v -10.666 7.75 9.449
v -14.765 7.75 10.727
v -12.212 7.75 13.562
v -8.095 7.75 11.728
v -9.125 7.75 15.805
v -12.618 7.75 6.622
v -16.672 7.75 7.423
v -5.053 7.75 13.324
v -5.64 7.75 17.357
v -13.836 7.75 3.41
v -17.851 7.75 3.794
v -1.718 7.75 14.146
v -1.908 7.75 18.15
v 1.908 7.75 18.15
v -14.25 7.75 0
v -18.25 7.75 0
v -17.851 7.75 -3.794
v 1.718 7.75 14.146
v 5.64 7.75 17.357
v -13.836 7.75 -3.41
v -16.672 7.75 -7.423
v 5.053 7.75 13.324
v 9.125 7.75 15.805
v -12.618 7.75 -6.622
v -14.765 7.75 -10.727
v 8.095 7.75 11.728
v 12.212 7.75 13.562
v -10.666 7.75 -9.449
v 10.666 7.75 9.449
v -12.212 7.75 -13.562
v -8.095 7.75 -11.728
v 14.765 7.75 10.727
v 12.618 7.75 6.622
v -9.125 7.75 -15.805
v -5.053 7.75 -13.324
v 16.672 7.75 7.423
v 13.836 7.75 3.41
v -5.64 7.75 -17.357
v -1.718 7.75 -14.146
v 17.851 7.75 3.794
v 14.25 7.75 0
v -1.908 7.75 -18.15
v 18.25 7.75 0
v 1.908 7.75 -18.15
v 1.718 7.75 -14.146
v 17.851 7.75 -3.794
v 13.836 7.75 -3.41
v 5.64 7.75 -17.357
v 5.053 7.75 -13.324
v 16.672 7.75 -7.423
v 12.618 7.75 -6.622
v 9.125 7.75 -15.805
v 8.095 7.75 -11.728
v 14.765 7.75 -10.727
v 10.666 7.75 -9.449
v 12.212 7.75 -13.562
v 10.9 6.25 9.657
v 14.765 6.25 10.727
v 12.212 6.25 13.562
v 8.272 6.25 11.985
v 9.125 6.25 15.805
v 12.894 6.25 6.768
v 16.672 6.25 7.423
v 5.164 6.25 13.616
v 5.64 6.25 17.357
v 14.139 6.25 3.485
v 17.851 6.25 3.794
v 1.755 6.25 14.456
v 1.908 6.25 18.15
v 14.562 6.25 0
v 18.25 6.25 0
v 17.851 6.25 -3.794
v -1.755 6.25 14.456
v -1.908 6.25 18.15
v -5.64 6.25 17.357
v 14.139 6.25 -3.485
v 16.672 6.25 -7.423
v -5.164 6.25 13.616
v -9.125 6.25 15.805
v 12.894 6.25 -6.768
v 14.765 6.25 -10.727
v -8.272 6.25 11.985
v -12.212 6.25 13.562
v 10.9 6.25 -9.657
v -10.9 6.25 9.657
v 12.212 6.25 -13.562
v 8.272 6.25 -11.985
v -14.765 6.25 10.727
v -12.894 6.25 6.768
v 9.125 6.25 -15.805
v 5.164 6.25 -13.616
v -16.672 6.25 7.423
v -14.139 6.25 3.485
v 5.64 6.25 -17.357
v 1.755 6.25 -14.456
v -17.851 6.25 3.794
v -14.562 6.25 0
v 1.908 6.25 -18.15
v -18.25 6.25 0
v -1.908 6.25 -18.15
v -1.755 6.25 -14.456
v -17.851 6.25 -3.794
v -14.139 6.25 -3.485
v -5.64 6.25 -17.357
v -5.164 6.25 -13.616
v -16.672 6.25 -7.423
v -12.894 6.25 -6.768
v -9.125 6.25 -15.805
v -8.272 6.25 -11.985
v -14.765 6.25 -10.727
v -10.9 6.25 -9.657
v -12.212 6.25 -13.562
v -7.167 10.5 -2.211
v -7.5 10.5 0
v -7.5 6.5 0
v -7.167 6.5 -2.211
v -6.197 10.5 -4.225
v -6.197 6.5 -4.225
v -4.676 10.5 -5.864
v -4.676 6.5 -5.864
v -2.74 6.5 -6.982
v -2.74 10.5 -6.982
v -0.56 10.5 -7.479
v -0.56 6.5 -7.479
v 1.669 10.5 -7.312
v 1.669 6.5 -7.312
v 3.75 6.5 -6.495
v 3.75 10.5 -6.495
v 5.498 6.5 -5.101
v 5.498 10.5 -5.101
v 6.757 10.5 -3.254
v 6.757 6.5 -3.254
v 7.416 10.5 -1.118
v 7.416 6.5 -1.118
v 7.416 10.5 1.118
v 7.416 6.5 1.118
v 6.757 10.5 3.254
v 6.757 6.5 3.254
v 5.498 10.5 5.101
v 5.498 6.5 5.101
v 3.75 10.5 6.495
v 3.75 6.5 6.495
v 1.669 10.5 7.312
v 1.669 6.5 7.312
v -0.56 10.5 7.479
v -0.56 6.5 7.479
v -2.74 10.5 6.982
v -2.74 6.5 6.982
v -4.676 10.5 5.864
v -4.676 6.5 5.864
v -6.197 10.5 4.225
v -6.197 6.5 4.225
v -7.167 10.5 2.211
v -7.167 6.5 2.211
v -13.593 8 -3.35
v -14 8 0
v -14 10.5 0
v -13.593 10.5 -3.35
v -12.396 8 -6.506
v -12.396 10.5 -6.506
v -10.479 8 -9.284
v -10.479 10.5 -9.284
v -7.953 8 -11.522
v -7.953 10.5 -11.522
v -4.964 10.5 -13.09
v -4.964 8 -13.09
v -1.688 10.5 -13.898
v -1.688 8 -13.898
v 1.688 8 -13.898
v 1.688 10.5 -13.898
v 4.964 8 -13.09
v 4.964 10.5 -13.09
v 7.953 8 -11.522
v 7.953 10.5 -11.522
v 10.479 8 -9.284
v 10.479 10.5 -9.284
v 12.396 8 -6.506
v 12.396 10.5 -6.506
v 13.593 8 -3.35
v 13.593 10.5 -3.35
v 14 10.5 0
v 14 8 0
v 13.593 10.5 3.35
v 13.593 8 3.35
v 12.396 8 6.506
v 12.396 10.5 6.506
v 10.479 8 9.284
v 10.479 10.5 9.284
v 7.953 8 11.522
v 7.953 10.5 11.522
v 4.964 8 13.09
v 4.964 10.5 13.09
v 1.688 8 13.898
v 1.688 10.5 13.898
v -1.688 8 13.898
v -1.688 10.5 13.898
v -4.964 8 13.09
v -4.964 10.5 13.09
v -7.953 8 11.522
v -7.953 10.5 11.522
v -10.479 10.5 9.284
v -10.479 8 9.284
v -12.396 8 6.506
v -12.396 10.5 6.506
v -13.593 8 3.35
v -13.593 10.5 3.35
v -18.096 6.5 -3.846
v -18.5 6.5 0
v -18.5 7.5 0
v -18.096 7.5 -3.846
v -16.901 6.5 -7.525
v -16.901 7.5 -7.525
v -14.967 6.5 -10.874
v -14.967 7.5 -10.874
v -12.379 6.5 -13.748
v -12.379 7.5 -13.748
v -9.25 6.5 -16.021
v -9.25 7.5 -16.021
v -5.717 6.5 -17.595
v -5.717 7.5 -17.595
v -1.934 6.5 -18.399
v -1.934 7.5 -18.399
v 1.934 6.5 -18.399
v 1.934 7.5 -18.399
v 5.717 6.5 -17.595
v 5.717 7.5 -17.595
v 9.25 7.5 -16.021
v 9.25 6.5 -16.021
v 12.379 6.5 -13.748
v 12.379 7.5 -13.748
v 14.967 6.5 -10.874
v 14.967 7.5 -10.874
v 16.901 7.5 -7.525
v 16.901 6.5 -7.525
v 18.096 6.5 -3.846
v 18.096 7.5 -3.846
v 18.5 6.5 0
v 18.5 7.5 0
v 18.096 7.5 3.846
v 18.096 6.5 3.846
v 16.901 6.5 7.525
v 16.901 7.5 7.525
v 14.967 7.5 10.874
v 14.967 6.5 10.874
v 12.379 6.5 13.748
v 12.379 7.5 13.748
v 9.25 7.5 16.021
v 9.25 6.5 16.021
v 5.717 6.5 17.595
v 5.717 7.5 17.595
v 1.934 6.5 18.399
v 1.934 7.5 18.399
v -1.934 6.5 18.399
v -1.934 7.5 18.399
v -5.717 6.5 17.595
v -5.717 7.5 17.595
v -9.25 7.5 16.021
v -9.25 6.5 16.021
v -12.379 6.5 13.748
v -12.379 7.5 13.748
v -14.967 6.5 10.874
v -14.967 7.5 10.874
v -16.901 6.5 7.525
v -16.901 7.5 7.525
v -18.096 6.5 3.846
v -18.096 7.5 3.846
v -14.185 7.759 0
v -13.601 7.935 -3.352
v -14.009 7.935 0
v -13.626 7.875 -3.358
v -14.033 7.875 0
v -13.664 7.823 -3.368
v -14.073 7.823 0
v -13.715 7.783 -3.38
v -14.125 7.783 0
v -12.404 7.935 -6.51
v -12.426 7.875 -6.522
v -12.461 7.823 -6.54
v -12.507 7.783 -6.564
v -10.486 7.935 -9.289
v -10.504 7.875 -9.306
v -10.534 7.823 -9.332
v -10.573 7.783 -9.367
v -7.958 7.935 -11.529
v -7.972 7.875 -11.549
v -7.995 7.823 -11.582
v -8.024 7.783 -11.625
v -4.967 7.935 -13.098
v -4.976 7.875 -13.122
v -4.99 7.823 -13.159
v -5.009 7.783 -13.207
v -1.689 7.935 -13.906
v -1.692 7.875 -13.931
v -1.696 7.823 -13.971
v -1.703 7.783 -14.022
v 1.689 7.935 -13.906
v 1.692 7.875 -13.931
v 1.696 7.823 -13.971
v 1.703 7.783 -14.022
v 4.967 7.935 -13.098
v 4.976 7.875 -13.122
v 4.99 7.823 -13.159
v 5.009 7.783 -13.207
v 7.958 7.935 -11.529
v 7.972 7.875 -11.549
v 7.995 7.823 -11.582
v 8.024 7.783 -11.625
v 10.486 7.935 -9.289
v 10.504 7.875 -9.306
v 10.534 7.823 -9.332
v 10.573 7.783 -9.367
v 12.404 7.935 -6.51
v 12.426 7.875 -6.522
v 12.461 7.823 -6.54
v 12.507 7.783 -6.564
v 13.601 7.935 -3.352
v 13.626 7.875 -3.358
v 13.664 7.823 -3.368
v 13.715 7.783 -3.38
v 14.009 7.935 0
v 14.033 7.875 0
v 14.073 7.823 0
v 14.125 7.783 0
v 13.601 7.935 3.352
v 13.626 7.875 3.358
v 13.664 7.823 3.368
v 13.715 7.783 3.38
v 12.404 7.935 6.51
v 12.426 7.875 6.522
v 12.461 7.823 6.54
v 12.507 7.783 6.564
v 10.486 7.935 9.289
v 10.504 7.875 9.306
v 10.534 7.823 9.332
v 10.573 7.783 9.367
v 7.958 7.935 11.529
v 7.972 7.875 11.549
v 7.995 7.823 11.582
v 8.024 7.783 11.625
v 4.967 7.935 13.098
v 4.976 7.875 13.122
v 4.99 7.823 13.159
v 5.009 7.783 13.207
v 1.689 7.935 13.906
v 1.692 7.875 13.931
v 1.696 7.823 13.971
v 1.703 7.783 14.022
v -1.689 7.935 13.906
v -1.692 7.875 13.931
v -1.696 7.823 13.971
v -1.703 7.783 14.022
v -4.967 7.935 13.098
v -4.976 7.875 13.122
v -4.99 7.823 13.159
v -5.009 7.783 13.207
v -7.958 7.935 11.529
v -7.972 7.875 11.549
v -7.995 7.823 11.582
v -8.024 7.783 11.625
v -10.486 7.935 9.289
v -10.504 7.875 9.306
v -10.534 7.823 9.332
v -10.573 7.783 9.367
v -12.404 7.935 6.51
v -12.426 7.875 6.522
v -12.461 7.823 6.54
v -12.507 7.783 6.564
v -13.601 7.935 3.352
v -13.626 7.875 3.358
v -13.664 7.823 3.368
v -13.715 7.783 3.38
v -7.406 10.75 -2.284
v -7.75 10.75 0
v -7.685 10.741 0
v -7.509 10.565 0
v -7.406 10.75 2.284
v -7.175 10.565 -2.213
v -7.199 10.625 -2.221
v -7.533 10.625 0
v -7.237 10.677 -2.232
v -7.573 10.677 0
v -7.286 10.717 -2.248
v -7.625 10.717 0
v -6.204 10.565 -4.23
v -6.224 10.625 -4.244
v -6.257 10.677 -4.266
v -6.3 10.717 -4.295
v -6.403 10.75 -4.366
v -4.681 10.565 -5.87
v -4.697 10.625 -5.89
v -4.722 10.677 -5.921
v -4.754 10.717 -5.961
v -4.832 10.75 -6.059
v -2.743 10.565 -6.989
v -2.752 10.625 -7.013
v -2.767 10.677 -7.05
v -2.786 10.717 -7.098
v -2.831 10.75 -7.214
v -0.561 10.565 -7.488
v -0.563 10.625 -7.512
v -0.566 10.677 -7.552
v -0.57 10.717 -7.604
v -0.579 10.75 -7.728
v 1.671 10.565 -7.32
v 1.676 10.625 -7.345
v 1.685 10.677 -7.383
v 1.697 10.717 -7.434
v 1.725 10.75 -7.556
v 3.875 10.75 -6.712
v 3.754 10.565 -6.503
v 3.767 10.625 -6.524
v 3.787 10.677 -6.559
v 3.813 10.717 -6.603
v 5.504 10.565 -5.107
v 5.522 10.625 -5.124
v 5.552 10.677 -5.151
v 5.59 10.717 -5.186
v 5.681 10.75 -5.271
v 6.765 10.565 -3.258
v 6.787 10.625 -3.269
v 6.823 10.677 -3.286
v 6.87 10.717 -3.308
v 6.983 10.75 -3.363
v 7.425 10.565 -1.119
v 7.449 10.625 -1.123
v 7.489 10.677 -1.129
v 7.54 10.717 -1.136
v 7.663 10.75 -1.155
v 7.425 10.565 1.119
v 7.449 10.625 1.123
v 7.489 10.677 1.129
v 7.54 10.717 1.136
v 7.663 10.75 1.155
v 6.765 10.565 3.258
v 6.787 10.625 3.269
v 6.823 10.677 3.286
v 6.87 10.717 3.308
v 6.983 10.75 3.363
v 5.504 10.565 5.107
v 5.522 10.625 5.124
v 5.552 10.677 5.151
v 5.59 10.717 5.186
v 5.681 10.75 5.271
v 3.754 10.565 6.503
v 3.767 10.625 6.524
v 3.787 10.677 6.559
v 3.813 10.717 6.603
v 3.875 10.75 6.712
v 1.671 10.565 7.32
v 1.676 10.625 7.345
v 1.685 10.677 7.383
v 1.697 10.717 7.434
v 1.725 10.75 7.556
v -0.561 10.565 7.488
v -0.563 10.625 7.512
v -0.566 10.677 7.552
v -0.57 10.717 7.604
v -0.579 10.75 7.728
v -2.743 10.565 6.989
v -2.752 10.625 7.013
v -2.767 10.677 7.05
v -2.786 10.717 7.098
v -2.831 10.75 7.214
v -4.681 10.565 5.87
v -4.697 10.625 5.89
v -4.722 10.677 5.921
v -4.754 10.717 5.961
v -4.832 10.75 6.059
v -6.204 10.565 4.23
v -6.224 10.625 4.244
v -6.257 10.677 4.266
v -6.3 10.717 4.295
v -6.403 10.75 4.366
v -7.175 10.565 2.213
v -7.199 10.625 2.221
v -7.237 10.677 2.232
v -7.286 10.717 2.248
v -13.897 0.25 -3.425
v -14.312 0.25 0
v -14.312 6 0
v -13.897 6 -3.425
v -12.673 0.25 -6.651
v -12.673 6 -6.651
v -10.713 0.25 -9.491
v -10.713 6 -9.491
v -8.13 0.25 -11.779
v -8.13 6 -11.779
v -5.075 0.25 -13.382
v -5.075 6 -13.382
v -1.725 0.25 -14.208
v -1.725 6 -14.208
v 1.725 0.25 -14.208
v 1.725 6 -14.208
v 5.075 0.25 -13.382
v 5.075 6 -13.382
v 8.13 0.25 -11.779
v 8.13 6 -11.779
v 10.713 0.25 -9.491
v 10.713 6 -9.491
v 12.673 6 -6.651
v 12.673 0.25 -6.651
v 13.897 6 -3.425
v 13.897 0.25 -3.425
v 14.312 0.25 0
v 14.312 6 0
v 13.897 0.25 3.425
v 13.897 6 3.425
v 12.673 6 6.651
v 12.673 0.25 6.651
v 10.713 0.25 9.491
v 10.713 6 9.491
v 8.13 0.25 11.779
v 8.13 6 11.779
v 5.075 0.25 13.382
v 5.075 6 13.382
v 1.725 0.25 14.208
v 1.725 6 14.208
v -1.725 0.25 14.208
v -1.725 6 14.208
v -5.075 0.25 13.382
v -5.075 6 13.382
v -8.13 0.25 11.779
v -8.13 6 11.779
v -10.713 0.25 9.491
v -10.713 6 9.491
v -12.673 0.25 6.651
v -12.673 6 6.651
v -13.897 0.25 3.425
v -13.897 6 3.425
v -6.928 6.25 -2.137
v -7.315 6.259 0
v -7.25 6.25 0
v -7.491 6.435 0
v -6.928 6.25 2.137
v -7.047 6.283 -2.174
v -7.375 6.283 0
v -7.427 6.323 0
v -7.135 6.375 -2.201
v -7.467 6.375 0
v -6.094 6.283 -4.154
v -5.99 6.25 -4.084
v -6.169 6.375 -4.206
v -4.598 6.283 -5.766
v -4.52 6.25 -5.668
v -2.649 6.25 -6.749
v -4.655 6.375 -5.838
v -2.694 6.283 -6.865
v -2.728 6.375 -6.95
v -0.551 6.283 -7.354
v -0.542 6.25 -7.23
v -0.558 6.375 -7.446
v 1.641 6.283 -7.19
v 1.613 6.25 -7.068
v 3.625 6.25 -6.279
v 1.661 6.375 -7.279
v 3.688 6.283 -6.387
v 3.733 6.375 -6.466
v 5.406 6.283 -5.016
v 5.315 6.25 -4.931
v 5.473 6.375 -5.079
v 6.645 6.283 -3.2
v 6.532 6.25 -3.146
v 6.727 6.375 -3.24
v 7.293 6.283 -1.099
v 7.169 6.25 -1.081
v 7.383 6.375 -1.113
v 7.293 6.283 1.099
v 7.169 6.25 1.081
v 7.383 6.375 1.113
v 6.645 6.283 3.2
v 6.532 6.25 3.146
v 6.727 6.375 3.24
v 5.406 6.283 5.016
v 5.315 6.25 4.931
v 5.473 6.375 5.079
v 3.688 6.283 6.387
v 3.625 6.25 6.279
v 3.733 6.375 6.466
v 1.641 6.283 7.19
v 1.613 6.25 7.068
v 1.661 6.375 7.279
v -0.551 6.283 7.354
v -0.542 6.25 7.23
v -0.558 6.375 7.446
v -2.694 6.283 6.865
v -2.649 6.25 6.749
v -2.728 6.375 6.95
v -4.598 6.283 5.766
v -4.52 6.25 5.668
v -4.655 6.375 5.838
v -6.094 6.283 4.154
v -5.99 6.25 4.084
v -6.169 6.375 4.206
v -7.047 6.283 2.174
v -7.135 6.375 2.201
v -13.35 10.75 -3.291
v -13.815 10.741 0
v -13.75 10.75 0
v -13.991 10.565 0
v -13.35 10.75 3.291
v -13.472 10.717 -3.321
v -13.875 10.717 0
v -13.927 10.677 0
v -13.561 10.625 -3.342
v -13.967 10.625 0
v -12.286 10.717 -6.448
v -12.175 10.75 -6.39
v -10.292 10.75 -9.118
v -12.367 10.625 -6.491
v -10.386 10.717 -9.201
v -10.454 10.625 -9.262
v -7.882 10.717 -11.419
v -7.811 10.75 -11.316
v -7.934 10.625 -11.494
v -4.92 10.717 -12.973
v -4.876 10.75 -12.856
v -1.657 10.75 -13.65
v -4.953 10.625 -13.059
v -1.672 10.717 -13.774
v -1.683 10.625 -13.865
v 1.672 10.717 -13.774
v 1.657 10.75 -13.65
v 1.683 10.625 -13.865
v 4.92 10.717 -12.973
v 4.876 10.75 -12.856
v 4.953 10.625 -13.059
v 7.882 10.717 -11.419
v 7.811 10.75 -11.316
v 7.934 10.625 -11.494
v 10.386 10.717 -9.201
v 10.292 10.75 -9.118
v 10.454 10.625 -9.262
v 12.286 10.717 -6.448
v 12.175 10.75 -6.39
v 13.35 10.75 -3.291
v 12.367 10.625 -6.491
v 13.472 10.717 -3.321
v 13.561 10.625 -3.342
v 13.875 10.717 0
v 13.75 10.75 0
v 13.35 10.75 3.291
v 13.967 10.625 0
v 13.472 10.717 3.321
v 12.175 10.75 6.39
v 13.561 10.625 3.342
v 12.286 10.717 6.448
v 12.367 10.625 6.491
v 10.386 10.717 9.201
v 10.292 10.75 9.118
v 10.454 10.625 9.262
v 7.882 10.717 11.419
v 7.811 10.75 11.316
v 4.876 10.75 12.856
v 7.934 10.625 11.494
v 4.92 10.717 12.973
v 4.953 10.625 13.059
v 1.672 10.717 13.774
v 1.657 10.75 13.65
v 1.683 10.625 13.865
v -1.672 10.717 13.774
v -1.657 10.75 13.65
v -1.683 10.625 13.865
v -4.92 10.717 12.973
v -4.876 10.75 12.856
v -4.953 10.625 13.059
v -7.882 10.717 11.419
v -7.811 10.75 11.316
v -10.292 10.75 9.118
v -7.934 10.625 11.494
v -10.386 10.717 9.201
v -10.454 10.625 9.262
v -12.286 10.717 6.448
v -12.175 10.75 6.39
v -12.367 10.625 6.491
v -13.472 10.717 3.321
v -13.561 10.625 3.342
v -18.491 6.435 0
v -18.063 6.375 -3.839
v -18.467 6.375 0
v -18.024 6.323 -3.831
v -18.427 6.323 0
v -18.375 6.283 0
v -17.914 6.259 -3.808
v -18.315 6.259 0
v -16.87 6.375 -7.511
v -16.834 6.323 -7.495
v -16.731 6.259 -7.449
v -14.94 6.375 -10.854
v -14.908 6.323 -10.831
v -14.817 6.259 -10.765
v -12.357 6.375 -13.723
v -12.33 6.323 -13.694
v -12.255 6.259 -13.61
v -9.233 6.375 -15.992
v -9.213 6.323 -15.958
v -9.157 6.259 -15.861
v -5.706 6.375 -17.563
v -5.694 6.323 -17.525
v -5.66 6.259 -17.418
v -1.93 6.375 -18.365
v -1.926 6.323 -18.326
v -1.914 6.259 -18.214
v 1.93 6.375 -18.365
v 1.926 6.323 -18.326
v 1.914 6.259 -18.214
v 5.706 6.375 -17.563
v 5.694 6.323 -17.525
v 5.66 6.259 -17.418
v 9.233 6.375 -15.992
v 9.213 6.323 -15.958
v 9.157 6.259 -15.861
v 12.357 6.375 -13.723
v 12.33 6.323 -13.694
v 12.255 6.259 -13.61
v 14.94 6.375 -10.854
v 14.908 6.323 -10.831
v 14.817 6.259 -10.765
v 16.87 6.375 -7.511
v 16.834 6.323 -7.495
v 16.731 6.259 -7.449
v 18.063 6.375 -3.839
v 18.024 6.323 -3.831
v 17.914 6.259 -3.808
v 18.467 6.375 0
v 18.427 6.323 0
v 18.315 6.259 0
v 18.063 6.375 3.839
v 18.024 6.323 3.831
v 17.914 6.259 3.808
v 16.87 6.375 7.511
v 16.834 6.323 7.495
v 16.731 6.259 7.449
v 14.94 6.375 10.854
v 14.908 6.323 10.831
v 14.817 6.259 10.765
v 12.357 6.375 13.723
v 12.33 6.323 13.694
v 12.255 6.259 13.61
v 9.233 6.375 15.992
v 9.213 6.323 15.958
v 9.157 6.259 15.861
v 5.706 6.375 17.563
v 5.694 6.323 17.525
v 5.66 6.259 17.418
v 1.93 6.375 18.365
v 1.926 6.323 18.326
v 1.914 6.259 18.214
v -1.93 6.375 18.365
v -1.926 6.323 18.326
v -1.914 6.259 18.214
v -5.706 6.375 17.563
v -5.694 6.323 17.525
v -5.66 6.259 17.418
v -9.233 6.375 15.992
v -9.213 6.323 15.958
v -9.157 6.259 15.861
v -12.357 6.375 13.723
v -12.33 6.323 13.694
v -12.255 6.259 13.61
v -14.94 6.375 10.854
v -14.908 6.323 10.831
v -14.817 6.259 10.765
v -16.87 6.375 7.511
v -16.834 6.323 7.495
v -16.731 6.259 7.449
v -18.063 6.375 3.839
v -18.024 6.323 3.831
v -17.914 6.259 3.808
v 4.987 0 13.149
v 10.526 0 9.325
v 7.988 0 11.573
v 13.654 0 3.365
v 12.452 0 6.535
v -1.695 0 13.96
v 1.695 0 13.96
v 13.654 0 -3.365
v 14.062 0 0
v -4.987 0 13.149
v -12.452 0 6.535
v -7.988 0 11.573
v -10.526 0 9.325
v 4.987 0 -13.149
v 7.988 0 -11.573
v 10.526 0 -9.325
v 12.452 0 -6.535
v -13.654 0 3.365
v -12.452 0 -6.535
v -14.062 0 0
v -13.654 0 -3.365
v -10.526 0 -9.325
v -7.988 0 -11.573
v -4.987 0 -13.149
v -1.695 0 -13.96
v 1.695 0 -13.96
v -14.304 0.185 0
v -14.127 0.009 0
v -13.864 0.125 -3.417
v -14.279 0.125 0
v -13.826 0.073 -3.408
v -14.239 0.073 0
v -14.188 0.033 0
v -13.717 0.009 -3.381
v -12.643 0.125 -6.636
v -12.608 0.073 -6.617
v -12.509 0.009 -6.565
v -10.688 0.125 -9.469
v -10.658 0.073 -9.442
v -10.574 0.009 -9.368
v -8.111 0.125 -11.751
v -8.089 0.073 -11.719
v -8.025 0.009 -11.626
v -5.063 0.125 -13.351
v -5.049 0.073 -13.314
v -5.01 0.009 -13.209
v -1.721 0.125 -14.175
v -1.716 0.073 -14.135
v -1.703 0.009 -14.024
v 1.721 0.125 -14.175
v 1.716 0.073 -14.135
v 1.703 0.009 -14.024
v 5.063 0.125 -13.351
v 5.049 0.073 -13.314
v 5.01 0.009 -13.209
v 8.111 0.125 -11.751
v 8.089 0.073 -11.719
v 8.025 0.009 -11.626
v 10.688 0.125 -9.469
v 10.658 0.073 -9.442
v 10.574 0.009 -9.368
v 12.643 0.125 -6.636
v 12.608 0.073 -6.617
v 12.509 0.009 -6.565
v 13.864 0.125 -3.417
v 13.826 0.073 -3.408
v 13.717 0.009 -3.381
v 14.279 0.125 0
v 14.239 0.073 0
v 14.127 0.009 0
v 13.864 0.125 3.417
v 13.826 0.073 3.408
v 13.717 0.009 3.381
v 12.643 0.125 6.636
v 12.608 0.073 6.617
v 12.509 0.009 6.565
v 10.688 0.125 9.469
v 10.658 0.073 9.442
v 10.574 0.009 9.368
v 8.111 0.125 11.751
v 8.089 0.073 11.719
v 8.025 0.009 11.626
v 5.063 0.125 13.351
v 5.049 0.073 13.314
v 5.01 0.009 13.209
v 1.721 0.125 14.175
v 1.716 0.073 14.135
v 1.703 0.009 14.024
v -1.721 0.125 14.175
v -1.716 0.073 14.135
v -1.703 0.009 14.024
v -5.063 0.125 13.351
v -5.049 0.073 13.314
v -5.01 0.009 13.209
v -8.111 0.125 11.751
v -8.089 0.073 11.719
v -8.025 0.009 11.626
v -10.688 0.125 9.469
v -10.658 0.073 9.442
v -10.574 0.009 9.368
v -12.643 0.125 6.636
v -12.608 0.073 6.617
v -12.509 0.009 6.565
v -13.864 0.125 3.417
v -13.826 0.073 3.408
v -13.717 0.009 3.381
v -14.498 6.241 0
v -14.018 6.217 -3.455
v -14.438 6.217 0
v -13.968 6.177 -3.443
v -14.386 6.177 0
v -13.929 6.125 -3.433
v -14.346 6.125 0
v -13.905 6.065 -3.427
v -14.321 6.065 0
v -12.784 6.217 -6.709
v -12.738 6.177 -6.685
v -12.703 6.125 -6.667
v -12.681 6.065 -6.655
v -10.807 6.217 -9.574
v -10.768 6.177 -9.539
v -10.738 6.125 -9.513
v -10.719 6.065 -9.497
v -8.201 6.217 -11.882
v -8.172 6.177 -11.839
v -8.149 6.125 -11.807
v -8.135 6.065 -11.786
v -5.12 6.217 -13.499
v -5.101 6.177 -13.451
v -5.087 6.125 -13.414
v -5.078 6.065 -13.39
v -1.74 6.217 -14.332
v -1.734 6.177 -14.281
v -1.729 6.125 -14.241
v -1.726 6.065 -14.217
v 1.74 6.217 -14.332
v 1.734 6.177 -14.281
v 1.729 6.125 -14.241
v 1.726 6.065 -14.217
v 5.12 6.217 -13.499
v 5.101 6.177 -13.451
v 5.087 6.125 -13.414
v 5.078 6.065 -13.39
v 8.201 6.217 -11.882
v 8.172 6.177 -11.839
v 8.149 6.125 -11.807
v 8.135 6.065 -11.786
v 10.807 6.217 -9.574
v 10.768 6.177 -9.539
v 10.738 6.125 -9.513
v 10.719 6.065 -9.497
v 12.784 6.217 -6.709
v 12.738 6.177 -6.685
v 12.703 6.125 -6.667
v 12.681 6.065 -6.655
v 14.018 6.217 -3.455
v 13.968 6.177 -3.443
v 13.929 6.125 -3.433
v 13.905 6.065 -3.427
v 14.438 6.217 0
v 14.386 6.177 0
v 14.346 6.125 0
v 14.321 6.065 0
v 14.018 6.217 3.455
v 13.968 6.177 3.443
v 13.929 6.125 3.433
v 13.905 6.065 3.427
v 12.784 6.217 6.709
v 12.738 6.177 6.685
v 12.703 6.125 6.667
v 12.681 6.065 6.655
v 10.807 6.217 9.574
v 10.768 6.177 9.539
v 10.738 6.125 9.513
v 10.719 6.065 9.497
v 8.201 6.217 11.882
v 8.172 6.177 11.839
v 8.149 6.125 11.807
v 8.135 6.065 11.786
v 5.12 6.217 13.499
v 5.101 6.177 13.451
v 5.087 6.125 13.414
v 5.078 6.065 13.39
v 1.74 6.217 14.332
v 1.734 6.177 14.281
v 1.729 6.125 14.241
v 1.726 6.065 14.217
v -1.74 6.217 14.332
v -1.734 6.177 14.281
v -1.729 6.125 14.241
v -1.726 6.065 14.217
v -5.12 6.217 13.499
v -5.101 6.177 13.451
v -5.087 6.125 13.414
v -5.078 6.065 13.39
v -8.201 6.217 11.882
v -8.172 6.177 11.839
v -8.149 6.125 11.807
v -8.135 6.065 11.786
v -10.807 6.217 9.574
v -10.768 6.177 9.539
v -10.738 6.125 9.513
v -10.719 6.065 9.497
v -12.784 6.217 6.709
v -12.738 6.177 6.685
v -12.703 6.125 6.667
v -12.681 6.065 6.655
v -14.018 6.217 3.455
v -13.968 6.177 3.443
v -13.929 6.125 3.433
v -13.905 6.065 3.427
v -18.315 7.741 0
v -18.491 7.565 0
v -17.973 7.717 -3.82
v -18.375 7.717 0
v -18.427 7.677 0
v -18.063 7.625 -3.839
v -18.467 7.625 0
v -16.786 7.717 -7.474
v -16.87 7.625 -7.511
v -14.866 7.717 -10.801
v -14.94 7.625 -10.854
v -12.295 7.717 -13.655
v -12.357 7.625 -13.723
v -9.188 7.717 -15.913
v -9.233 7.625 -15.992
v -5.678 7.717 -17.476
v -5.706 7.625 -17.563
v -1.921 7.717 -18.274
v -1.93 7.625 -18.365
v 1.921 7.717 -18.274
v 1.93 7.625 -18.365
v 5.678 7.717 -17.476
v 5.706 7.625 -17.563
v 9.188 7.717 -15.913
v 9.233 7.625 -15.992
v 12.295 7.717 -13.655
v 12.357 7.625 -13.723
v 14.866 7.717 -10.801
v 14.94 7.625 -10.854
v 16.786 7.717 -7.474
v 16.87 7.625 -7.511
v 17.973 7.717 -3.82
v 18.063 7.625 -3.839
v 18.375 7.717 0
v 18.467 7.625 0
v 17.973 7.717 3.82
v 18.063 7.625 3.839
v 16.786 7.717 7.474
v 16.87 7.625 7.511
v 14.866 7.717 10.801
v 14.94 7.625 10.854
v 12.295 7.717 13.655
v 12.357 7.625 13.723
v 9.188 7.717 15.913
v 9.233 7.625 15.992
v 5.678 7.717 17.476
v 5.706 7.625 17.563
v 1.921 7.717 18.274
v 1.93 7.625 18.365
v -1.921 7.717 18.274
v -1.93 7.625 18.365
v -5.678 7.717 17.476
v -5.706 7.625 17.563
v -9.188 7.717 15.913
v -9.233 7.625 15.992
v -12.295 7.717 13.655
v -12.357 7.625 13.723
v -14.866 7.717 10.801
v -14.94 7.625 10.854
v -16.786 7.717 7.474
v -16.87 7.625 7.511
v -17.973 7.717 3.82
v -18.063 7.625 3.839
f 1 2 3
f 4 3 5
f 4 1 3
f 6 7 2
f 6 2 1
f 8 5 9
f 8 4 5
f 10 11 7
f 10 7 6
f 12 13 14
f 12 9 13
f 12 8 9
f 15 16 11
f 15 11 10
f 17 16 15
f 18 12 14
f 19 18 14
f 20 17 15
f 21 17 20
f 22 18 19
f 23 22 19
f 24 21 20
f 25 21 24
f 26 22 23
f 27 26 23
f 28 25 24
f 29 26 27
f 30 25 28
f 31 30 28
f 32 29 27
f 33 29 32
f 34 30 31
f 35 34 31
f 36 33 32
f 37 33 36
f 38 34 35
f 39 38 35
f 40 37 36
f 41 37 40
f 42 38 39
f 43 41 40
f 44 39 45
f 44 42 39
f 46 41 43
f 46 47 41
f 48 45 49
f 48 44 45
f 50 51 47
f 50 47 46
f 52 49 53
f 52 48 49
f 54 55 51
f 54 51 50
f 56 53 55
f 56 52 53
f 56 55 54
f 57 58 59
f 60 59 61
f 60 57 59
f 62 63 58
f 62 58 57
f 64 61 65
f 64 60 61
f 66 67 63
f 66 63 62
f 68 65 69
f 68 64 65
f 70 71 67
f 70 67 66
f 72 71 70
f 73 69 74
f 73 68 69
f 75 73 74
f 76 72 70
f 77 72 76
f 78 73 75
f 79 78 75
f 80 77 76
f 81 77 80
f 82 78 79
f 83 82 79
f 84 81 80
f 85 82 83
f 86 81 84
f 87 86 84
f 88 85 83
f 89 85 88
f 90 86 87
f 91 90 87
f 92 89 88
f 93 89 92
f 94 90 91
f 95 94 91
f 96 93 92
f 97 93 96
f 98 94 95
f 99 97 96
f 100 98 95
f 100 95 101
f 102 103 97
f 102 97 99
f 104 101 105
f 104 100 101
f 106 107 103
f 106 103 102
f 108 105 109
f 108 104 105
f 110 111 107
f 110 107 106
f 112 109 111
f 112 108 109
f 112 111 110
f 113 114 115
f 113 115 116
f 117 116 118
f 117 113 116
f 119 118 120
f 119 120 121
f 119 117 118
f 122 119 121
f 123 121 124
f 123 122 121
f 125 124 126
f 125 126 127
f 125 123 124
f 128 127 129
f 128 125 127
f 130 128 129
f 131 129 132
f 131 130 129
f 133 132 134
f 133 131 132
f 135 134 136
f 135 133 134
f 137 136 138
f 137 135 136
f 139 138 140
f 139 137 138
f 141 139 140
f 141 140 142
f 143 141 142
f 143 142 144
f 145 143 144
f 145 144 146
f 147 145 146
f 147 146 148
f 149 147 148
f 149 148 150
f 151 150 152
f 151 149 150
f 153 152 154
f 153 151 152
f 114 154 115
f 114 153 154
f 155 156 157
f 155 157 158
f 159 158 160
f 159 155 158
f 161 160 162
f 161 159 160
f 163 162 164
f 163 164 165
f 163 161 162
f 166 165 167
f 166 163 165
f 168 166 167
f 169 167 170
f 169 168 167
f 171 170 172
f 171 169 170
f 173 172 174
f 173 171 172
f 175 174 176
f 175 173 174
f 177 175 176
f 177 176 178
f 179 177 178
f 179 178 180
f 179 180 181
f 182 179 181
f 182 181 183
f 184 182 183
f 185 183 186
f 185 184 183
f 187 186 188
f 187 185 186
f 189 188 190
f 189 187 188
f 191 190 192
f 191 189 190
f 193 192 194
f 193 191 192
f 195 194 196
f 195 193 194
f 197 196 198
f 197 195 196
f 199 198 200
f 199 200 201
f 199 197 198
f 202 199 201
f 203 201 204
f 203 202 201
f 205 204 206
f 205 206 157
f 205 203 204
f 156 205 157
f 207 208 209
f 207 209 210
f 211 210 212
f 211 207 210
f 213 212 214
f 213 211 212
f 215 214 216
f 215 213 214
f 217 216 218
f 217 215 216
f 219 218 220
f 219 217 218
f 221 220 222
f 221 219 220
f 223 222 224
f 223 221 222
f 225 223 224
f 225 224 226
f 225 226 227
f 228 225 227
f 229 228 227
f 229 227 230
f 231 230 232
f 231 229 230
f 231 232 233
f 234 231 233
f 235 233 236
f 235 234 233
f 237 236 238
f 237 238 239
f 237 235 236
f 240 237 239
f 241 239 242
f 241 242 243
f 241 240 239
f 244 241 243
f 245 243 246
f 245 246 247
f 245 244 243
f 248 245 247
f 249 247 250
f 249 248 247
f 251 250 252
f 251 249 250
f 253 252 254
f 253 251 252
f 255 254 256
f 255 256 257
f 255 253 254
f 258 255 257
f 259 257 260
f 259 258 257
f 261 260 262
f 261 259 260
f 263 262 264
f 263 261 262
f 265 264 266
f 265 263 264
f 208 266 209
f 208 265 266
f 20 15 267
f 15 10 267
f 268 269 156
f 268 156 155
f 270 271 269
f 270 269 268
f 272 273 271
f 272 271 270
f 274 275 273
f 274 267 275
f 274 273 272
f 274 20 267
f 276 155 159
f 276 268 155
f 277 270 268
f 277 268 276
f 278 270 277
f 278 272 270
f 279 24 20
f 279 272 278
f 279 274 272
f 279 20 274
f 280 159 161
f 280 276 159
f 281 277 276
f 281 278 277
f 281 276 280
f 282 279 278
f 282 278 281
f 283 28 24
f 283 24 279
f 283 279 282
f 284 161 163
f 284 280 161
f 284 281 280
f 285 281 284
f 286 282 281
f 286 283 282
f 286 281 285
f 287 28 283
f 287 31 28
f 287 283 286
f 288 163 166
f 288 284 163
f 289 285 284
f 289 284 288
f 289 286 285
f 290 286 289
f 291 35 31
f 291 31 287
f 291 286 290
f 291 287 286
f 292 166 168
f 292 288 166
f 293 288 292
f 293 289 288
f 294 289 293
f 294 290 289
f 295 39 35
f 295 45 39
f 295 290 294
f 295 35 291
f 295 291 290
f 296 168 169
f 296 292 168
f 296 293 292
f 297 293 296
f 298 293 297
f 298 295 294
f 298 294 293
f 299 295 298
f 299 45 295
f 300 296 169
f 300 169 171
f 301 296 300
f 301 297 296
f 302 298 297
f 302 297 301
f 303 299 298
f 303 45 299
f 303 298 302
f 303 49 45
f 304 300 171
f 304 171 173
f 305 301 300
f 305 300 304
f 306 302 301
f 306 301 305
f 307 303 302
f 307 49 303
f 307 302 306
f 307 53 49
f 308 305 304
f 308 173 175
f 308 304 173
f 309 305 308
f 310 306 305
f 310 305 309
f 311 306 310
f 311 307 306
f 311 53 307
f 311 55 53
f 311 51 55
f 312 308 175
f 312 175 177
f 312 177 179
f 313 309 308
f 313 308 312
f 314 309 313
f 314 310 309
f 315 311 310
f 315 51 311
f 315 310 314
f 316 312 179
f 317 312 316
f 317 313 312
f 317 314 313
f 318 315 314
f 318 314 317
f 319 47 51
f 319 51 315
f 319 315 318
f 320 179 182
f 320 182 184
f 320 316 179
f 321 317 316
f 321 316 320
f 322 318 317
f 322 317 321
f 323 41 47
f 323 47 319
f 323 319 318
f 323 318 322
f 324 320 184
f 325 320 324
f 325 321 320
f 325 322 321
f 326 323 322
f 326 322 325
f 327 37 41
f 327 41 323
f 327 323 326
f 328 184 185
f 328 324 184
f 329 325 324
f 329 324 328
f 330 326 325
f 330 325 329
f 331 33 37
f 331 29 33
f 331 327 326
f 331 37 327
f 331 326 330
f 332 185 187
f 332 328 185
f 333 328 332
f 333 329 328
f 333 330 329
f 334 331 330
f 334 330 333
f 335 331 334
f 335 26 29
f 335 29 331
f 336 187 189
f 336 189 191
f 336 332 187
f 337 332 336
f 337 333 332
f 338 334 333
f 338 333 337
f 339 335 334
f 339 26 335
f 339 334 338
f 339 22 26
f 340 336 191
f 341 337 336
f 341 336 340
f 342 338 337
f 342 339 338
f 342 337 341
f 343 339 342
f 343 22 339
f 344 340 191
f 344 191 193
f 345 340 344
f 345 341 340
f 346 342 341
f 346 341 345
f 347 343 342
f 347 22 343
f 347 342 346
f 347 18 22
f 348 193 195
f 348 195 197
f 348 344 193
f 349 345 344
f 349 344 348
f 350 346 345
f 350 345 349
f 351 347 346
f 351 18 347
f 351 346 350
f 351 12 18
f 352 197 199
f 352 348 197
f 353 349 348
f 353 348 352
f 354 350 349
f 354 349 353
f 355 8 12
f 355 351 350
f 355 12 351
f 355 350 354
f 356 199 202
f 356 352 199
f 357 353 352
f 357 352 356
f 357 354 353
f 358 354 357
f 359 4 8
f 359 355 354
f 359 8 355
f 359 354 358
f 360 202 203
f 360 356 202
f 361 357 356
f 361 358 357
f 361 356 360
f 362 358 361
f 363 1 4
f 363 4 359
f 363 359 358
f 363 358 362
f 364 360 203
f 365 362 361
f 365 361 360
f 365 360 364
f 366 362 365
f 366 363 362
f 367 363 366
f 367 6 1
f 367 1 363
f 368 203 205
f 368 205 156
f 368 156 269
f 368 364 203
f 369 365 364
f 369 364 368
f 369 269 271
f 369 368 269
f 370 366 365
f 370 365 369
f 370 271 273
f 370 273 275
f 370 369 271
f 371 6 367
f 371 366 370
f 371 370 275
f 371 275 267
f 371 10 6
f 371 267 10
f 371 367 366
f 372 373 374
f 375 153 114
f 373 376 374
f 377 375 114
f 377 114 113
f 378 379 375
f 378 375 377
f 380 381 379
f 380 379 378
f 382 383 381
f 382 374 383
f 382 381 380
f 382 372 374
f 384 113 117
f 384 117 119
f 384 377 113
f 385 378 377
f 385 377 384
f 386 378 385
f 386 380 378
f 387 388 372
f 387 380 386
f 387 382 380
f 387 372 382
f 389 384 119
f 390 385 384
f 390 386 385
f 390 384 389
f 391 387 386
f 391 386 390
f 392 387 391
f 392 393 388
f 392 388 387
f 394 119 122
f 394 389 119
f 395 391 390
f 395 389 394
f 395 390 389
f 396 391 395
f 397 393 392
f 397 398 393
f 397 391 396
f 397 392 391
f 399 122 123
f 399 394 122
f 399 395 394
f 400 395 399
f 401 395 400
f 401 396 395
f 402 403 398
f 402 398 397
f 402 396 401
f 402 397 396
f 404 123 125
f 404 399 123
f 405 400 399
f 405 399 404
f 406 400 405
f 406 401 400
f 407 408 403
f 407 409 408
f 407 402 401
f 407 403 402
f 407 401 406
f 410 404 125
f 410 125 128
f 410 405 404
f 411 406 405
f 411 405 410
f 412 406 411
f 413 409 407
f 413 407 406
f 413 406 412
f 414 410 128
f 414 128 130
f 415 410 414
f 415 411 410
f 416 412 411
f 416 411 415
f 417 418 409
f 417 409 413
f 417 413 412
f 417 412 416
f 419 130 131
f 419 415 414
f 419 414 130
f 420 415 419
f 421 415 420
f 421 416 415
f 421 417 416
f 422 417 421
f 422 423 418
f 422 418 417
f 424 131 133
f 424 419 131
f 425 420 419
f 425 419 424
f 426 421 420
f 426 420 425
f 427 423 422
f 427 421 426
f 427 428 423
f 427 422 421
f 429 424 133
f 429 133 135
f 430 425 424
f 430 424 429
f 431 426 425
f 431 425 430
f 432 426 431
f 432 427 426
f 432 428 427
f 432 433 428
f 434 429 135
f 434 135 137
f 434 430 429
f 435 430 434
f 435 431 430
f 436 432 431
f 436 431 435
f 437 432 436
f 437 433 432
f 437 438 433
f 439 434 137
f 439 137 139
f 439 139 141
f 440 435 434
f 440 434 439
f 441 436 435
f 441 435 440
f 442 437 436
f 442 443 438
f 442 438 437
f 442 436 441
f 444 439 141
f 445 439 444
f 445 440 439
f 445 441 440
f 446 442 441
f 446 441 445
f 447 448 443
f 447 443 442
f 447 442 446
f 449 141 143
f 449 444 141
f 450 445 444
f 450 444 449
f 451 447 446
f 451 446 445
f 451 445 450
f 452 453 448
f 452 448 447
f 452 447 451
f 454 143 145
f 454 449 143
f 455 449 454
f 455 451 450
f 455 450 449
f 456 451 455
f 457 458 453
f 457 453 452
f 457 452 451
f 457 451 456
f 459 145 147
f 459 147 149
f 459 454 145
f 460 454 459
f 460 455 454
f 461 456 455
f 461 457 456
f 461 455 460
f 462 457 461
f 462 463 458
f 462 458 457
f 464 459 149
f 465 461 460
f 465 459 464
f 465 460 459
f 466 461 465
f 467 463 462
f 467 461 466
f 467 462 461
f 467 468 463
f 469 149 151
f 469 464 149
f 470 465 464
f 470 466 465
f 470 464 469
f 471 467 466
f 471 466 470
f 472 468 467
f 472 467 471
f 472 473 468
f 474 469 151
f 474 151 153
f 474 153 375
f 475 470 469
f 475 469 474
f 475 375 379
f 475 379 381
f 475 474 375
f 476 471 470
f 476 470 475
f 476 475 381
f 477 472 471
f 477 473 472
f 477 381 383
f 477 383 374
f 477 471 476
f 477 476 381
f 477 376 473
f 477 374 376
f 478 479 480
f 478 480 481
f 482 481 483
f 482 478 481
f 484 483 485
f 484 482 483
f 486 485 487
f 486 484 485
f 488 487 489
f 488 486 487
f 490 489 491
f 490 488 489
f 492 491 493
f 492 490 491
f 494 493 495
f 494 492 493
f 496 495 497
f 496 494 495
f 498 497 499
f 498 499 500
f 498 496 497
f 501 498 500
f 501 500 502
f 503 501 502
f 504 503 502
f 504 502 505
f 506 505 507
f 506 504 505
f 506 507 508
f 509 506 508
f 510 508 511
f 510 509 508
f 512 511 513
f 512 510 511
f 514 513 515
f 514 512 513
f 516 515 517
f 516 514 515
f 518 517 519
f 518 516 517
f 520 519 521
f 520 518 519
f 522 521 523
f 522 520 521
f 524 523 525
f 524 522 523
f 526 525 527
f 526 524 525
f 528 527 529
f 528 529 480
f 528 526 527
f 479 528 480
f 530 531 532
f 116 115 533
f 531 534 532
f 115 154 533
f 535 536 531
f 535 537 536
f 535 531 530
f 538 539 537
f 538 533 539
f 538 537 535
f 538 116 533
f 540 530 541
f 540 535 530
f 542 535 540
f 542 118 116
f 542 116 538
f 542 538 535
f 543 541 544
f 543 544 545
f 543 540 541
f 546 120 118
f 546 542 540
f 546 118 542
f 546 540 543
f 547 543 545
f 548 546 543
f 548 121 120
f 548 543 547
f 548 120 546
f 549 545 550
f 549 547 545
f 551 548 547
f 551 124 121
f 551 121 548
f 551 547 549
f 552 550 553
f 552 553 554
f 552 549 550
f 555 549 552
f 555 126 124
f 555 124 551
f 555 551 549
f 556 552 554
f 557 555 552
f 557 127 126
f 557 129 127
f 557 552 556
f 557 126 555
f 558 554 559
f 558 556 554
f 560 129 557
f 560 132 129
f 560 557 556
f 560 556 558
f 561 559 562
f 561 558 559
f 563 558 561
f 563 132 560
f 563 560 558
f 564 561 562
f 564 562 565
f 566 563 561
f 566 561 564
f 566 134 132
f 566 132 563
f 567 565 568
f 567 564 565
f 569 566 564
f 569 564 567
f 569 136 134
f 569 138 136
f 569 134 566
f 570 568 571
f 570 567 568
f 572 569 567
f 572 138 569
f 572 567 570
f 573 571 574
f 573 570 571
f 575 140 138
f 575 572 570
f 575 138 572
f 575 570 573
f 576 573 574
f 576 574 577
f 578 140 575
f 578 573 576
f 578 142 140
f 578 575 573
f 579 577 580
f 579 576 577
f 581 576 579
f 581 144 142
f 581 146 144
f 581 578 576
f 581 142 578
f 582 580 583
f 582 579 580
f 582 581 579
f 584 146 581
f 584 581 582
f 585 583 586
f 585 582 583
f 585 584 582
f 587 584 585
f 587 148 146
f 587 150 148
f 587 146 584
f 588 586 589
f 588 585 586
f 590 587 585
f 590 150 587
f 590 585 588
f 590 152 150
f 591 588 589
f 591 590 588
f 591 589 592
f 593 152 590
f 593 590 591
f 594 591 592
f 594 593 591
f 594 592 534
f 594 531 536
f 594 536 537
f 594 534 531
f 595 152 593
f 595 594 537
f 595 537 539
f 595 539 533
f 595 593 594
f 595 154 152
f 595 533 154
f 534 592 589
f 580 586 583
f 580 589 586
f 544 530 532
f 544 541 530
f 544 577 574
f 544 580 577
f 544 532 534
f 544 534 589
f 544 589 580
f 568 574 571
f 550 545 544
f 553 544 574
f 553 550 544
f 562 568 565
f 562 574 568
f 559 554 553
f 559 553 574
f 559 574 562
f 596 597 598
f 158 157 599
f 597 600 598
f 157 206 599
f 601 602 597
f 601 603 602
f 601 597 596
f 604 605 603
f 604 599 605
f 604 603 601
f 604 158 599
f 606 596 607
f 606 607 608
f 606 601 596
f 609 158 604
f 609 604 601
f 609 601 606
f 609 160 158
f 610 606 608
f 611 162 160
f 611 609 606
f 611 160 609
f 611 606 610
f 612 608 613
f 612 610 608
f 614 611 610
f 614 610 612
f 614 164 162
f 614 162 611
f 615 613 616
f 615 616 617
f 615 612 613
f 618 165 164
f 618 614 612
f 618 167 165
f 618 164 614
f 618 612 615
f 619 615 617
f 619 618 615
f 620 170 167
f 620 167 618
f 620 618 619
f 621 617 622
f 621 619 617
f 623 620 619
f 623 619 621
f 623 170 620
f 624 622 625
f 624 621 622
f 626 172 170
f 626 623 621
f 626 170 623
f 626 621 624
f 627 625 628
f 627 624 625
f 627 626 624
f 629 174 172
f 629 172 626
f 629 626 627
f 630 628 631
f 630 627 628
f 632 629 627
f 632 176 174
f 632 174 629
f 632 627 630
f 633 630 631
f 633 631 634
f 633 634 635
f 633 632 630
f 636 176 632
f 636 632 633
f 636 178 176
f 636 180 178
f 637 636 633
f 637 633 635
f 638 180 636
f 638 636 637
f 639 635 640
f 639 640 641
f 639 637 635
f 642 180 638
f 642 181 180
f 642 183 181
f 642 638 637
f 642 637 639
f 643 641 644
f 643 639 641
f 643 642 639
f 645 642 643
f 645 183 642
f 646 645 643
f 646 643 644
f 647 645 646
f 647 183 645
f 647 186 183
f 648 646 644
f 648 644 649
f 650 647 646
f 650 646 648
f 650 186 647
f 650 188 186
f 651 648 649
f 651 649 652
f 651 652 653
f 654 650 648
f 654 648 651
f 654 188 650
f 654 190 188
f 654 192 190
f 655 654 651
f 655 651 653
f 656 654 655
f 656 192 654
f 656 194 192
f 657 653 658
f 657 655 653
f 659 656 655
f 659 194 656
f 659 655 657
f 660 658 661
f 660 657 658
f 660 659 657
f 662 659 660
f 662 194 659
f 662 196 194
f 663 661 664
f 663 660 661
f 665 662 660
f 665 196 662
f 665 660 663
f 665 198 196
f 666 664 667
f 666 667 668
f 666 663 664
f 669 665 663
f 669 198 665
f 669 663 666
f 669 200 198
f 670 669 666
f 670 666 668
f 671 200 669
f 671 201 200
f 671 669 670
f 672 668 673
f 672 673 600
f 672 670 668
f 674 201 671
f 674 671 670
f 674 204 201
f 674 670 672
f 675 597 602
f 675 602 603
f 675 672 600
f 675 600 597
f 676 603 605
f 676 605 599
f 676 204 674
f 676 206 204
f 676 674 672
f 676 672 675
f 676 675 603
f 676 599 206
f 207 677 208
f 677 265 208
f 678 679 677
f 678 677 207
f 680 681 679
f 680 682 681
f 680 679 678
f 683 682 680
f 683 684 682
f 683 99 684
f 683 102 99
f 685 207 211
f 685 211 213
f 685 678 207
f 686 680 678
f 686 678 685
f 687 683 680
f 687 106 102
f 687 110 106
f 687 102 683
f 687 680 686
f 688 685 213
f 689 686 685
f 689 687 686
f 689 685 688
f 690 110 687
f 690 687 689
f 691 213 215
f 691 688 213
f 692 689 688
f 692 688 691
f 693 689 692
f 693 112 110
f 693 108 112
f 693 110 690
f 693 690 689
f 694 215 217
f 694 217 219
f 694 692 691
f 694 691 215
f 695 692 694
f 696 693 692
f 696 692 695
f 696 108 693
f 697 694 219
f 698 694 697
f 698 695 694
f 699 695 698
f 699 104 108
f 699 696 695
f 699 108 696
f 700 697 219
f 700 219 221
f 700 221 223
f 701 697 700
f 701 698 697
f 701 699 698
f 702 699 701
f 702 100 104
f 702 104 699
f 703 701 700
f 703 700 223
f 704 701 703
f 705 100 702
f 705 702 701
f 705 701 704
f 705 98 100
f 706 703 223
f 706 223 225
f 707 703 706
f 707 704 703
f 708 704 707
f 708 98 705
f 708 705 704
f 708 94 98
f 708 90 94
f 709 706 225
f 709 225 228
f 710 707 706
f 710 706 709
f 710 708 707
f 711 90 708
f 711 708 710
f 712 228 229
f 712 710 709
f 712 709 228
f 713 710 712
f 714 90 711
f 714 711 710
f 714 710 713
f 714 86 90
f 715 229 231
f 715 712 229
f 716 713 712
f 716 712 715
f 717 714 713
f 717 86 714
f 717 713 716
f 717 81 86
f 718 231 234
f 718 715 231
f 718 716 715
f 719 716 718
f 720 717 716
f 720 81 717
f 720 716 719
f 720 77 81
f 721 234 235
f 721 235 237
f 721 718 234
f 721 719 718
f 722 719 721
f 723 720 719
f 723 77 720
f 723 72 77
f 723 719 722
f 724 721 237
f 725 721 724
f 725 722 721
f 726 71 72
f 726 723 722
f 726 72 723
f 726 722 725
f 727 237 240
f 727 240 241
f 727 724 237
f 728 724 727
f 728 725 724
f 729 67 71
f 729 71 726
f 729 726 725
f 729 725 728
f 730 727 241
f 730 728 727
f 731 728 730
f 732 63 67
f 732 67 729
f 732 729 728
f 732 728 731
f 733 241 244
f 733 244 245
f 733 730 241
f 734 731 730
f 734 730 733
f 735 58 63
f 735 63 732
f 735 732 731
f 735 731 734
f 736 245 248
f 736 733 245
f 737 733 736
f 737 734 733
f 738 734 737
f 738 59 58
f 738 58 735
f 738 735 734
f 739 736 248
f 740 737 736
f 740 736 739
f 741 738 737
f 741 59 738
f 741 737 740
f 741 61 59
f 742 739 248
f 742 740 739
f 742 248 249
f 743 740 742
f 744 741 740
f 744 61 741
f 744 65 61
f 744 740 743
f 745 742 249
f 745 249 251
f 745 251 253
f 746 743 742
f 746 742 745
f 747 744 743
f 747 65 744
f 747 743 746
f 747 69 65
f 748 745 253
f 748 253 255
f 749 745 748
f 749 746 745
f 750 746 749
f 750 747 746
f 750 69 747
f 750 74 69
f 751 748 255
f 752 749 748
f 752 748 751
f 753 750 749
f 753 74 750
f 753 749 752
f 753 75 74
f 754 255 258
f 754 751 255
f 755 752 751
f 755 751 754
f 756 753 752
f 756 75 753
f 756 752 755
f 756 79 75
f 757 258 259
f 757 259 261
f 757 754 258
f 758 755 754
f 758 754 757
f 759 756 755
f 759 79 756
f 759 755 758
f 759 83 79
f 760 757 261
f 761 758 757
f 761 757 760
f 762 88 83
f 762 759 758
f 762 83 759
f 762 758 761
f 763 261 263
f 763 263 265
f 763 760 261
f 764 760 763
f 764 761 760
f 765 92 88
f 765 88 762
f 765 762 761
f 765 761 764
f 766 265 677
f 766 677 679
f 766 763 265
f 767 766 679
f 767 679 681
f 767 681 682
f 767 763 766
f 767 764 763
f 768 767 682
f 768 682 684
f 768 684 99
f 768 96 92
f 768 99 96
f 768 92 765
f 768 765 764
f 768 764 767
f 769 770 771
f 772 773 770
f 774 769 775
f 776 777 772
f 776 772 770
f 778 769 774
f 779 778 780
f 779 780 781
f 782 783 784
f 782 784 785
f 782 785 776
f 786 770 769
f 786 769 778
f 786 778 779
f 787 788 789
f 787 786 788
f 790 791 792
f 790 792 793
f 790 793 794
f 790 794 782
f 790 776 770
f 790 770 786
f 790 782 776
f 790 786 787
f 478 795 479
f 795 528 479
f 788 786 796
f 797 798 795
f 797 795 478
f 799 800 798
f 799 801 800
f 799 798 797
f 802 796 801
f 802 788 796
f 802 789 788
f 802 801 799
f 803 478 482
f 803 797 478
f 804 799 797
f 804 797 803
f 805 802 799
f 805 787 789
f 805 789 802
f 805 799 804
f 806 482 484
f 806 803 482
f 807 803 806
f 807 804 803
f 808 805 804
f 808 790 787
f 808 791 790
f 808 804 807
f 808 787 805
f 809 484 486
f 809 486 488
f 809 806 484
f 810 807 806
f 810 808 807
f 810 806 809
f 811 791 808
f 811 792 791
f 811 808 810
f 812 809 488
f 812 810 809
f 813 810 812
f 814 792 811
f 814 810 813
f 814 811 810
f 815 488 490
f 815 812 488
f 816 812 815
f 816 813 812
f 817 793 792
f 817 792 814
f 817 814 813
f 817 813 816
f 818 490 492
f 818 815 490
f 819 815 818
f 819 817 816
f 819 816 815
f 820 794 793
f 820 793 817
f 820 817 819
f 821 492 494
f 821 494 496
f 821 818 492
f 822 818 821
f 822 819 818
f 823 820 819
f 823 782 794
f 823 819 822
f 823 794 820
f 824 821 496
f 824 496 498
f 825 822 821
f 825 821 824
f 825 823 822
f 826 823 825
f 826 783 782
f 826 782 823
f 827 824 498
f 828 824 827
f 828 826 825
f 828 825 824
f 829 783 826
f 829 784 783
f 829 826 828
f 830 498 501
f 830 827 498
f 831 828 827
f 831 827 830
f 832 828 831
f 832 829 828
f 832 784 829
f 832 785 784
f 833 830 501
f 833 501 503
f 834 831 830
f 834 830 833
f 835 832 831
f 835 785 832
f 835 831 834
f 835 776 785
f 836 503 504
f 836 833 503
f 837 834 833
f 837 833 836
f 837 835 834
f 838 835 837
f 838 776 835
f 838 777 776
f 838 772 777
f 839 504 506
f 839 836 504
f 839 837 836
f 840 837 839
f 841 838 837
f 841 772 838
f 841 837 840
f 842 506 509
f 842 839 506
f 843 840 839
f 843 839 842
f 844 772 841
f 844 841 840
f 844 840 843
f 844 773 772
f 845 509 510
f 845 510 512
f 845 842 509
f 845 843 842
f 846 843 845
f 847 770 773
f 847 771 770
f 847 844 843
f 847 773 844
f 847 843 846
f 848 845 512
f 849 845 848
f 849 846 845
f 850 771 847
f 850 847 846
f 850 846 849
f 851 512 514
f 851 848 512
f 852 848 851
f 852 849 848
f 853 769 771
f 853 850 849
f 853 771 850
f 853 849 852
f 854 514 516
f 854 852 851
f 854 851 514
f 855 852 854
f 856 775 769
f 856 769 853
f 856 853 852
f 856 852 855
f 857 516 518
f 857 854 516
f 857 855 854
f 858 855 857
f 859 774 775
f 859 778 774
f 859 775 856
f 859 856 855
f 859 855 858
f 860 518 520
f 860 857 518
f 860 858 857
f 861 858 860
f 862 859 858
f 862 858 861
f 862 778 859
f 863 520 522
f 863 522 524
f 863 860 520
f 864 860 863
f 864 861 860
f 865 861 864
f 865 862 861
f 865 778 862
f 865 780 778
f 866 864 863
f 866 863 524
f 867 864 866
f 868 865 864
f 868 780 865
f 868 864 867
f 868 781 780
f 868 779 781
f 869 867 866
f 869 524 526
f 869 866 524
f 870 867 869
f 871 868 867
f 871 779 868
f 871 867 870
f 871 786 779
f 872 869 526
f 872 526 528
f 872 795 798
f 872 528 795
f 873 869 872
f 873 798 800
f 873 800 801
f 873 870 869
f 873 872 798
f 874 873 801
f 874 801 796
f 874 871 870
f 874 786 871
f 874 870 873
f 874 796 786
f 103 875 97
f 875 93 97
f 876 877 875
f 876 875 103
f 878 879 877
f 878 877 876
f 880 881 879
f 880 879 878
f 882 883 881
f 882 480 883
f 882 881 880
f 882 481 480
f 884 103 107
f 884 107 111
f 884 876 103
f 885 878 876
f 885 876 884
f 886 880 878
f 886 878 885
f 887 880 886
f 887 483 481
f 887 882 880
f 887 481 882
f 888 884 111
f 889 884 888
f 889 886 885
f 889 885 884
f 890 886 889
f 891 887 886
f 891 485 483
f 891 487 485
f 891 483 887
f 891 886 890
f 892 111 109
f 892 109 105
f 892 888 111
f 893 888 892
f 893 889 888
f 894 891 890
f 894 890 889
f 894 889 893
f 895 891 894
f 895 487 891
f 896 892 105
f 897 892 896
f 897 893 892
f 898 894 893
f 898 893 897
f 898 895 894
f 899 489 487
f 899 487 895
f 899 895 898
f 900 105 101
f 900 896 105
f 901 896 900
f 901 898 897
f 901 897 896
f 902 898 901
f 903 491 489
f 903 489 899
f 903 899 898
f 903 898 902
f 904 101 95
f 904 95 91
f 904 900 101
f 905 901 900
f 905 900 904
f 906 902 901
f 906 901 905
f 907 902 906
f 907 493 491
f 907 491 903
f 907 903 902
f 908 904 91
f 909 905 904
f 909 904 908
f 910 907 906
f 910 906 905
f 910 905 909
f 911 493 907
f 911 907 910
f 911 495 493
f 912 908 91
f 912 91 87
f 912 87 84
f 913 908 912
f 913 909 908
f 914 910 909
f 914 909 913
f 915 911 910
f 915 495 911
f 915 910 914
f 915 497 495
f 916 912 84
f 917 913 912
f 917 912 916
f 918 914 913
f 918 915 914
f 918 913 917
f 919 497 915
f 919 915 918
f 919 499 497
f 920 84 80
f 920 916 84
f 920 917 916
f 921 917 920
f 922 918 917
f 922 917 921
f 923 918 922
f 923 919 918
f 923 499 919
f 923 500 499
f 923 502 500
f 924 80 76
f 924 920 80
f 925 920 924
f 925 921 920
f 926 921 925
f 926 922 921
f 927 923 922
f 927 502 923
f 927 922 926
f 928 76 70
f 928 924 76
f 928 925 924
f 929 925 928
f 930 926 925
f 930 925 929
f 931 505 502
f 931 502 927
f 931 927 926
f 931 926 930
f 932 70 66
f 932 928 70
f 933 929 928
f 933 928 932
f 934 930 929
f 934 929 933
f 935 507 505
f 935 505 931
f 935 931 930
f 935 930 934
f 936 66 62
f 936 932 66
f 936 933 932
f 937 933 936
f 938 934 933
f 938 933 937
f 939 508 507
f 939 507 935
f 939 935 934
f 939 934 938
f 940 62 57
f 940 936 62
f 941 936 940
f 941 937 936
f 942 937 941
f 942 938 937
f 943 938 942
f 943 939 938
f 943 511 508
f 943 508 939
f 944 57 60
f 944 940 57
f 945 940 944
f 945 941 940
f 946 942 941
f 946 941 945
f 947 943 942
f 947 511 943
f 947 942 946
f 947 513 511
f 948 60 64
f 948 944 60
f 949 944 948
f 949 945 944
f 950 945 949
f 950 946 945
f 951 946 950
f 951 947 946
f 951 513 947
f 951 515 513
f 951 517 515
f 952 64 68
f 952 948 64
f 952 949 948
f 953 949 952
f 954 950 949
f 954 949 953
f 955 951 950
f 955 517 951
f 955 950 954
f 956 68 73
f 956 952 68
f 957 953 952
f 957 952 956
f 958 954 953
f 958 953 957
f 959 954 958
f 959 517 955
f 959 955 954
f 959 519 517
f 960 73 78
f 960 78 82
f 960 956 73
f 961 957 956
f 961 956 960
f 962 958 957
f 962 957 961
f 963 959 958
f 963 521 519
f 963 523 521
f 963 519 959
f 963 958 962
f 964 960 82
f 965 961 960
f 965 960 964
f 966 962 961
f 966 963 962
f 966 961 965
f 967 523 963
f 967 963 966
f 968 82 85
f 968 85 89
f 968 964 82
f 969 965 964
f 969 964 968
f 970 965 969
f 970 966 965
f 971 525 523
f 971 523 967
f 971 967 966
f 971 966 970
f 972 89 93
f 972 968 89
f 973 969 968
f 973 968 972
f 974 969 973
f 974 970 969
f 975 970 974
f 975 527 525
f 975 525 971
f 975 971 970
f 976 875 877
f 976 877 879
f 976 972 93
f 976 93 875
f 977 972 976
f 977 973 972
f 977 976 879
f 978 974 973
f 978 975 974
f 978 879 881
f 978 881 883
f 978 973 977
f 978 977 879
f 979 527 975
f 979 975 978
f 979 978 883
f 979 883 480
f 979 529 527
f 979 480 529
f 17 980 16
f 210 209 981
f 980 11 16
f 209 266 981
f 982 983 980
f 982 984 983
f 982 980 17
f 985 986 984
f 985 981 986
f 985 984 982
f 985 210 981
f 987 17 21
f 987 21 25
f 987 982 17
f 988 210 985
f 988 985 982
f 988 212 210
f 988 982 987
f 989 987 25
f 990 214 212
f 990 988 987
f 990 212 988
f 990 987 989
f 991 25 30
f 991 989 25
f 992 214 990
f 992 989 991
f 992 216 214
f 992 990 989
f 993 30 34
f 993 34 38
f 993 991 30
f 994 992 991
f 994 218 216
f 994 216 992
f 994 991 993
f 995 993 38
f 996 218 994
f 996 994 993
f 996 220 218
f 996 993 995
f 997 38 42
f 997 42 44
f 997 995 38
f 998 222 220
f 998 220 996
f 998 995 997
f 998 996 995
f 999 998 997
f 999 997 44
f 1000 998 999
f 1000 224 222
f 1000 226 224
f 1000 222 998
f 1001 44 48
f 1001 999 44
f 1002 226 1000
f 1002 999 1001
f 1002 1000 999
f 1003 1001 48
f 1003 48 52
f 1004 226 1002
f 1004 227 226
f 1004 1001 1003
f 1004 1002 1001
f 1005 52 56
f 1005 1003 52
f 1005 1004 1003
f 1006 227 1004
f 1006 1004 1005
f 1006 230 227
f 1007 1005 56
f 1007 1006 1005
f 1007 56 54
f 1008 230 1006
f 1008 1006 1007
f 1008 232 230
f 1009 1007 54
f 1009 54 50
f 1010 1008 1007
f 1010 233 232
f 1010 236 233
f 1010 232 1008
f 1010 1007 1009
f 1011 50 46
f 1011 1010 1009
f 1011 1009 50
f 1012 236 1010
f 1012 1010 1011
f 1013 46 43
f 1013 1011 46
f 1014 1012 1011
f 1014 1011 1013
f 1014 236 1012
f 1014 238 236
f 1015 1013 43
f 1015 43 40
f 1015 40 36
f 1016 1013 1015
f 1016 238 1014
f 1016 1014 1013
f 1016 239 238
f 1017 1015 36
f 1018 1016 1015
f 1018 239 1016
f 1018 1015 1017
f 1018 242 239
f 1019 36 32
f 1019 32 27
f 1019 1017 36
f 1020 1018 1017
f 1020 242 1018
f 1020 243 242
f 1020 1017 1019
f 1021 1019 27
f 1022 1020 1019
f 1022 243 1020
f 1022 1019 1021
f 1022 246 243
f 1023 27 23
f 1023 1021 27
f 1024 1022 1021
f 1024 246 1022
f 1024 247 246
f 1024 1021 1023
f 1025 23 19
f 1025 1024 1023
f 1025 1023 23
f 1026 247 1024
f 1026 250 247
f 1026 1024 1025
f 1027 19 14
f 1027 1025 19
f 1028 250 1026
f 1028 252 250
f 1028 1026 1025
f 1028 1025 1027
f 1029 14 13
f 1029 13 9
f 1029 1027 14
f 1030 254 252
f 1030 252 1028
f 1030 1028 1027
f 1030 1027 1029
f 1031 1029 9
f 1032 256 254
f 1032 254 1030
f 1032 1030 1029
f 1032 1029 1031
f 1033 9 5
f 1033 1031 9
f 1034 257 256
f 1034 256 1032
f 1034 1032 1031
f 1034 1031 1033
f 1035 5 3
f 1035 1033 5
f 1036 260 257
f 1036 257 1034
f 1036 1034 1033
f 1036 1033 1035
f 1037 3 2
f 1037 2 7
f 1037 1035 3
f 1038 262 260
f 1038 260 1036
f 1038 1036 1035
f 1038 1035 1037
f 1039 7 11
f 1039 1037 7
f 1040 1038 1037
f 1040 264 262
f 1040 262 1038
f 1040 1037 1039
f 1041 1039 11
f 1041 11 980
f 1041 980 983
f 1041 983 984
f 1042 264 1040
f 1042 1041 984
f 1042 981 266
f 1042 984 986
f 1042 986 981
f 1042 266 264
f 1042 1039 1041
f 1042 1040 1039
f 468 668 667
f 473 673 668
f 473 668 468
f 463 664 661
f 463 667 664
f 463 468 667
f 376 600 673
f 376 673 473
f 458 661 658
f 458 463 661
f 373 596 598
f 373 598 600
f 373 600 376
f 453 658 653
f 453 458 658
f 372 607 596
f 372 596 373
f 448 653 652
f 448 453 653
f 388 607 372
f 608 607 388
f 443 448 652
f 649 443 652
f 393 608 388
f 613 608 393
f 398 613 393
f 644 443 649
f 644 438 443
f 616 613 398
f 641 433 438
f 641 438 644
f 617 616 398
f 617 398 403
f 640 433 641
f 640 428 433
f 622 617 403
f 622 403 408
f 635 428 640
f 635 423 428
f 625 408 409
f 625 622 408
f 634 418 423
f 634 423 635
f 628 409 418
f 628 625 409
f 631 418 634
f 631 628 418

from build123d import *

# Parameters (mm, degrees)
FILLET1_R = 0.25


with BuildPart() as part:
    # Sketch1 → Revolve1 (revolve)
    with BuildSketch(Plane.XY):
        Polygon((0, 0), (0, 6.25), (-7.5, 6.25), (-7.5, 10.75), (-14, 10.75), (-14, 7.75), (-18.5, 7.75), (-18.5, 6.25), (-14.3125, 6.25), (-14.3125, 0), align=None)
    revolve(axis=Axis((0, 17.96875, 0), (0, -1, 0)))

    # Fillet1
    fillet1_edges = [part.edges().sort_by_distance(p)[0] for p in [
        (14, 10.75, 0),
        (7.5, 10.75, 0),
        (7.5, 6.25, 0),
        (14.3125, 0, 0),
        (14.3125, 6.25, 0),
        (18.5, 6.25, 0),
        (18.5, 7.75, 0),
        (14, 7.75, 0),
    ]]
    fillet(fillet1_edges, radius=FILLET1_R)


solid = part.part
